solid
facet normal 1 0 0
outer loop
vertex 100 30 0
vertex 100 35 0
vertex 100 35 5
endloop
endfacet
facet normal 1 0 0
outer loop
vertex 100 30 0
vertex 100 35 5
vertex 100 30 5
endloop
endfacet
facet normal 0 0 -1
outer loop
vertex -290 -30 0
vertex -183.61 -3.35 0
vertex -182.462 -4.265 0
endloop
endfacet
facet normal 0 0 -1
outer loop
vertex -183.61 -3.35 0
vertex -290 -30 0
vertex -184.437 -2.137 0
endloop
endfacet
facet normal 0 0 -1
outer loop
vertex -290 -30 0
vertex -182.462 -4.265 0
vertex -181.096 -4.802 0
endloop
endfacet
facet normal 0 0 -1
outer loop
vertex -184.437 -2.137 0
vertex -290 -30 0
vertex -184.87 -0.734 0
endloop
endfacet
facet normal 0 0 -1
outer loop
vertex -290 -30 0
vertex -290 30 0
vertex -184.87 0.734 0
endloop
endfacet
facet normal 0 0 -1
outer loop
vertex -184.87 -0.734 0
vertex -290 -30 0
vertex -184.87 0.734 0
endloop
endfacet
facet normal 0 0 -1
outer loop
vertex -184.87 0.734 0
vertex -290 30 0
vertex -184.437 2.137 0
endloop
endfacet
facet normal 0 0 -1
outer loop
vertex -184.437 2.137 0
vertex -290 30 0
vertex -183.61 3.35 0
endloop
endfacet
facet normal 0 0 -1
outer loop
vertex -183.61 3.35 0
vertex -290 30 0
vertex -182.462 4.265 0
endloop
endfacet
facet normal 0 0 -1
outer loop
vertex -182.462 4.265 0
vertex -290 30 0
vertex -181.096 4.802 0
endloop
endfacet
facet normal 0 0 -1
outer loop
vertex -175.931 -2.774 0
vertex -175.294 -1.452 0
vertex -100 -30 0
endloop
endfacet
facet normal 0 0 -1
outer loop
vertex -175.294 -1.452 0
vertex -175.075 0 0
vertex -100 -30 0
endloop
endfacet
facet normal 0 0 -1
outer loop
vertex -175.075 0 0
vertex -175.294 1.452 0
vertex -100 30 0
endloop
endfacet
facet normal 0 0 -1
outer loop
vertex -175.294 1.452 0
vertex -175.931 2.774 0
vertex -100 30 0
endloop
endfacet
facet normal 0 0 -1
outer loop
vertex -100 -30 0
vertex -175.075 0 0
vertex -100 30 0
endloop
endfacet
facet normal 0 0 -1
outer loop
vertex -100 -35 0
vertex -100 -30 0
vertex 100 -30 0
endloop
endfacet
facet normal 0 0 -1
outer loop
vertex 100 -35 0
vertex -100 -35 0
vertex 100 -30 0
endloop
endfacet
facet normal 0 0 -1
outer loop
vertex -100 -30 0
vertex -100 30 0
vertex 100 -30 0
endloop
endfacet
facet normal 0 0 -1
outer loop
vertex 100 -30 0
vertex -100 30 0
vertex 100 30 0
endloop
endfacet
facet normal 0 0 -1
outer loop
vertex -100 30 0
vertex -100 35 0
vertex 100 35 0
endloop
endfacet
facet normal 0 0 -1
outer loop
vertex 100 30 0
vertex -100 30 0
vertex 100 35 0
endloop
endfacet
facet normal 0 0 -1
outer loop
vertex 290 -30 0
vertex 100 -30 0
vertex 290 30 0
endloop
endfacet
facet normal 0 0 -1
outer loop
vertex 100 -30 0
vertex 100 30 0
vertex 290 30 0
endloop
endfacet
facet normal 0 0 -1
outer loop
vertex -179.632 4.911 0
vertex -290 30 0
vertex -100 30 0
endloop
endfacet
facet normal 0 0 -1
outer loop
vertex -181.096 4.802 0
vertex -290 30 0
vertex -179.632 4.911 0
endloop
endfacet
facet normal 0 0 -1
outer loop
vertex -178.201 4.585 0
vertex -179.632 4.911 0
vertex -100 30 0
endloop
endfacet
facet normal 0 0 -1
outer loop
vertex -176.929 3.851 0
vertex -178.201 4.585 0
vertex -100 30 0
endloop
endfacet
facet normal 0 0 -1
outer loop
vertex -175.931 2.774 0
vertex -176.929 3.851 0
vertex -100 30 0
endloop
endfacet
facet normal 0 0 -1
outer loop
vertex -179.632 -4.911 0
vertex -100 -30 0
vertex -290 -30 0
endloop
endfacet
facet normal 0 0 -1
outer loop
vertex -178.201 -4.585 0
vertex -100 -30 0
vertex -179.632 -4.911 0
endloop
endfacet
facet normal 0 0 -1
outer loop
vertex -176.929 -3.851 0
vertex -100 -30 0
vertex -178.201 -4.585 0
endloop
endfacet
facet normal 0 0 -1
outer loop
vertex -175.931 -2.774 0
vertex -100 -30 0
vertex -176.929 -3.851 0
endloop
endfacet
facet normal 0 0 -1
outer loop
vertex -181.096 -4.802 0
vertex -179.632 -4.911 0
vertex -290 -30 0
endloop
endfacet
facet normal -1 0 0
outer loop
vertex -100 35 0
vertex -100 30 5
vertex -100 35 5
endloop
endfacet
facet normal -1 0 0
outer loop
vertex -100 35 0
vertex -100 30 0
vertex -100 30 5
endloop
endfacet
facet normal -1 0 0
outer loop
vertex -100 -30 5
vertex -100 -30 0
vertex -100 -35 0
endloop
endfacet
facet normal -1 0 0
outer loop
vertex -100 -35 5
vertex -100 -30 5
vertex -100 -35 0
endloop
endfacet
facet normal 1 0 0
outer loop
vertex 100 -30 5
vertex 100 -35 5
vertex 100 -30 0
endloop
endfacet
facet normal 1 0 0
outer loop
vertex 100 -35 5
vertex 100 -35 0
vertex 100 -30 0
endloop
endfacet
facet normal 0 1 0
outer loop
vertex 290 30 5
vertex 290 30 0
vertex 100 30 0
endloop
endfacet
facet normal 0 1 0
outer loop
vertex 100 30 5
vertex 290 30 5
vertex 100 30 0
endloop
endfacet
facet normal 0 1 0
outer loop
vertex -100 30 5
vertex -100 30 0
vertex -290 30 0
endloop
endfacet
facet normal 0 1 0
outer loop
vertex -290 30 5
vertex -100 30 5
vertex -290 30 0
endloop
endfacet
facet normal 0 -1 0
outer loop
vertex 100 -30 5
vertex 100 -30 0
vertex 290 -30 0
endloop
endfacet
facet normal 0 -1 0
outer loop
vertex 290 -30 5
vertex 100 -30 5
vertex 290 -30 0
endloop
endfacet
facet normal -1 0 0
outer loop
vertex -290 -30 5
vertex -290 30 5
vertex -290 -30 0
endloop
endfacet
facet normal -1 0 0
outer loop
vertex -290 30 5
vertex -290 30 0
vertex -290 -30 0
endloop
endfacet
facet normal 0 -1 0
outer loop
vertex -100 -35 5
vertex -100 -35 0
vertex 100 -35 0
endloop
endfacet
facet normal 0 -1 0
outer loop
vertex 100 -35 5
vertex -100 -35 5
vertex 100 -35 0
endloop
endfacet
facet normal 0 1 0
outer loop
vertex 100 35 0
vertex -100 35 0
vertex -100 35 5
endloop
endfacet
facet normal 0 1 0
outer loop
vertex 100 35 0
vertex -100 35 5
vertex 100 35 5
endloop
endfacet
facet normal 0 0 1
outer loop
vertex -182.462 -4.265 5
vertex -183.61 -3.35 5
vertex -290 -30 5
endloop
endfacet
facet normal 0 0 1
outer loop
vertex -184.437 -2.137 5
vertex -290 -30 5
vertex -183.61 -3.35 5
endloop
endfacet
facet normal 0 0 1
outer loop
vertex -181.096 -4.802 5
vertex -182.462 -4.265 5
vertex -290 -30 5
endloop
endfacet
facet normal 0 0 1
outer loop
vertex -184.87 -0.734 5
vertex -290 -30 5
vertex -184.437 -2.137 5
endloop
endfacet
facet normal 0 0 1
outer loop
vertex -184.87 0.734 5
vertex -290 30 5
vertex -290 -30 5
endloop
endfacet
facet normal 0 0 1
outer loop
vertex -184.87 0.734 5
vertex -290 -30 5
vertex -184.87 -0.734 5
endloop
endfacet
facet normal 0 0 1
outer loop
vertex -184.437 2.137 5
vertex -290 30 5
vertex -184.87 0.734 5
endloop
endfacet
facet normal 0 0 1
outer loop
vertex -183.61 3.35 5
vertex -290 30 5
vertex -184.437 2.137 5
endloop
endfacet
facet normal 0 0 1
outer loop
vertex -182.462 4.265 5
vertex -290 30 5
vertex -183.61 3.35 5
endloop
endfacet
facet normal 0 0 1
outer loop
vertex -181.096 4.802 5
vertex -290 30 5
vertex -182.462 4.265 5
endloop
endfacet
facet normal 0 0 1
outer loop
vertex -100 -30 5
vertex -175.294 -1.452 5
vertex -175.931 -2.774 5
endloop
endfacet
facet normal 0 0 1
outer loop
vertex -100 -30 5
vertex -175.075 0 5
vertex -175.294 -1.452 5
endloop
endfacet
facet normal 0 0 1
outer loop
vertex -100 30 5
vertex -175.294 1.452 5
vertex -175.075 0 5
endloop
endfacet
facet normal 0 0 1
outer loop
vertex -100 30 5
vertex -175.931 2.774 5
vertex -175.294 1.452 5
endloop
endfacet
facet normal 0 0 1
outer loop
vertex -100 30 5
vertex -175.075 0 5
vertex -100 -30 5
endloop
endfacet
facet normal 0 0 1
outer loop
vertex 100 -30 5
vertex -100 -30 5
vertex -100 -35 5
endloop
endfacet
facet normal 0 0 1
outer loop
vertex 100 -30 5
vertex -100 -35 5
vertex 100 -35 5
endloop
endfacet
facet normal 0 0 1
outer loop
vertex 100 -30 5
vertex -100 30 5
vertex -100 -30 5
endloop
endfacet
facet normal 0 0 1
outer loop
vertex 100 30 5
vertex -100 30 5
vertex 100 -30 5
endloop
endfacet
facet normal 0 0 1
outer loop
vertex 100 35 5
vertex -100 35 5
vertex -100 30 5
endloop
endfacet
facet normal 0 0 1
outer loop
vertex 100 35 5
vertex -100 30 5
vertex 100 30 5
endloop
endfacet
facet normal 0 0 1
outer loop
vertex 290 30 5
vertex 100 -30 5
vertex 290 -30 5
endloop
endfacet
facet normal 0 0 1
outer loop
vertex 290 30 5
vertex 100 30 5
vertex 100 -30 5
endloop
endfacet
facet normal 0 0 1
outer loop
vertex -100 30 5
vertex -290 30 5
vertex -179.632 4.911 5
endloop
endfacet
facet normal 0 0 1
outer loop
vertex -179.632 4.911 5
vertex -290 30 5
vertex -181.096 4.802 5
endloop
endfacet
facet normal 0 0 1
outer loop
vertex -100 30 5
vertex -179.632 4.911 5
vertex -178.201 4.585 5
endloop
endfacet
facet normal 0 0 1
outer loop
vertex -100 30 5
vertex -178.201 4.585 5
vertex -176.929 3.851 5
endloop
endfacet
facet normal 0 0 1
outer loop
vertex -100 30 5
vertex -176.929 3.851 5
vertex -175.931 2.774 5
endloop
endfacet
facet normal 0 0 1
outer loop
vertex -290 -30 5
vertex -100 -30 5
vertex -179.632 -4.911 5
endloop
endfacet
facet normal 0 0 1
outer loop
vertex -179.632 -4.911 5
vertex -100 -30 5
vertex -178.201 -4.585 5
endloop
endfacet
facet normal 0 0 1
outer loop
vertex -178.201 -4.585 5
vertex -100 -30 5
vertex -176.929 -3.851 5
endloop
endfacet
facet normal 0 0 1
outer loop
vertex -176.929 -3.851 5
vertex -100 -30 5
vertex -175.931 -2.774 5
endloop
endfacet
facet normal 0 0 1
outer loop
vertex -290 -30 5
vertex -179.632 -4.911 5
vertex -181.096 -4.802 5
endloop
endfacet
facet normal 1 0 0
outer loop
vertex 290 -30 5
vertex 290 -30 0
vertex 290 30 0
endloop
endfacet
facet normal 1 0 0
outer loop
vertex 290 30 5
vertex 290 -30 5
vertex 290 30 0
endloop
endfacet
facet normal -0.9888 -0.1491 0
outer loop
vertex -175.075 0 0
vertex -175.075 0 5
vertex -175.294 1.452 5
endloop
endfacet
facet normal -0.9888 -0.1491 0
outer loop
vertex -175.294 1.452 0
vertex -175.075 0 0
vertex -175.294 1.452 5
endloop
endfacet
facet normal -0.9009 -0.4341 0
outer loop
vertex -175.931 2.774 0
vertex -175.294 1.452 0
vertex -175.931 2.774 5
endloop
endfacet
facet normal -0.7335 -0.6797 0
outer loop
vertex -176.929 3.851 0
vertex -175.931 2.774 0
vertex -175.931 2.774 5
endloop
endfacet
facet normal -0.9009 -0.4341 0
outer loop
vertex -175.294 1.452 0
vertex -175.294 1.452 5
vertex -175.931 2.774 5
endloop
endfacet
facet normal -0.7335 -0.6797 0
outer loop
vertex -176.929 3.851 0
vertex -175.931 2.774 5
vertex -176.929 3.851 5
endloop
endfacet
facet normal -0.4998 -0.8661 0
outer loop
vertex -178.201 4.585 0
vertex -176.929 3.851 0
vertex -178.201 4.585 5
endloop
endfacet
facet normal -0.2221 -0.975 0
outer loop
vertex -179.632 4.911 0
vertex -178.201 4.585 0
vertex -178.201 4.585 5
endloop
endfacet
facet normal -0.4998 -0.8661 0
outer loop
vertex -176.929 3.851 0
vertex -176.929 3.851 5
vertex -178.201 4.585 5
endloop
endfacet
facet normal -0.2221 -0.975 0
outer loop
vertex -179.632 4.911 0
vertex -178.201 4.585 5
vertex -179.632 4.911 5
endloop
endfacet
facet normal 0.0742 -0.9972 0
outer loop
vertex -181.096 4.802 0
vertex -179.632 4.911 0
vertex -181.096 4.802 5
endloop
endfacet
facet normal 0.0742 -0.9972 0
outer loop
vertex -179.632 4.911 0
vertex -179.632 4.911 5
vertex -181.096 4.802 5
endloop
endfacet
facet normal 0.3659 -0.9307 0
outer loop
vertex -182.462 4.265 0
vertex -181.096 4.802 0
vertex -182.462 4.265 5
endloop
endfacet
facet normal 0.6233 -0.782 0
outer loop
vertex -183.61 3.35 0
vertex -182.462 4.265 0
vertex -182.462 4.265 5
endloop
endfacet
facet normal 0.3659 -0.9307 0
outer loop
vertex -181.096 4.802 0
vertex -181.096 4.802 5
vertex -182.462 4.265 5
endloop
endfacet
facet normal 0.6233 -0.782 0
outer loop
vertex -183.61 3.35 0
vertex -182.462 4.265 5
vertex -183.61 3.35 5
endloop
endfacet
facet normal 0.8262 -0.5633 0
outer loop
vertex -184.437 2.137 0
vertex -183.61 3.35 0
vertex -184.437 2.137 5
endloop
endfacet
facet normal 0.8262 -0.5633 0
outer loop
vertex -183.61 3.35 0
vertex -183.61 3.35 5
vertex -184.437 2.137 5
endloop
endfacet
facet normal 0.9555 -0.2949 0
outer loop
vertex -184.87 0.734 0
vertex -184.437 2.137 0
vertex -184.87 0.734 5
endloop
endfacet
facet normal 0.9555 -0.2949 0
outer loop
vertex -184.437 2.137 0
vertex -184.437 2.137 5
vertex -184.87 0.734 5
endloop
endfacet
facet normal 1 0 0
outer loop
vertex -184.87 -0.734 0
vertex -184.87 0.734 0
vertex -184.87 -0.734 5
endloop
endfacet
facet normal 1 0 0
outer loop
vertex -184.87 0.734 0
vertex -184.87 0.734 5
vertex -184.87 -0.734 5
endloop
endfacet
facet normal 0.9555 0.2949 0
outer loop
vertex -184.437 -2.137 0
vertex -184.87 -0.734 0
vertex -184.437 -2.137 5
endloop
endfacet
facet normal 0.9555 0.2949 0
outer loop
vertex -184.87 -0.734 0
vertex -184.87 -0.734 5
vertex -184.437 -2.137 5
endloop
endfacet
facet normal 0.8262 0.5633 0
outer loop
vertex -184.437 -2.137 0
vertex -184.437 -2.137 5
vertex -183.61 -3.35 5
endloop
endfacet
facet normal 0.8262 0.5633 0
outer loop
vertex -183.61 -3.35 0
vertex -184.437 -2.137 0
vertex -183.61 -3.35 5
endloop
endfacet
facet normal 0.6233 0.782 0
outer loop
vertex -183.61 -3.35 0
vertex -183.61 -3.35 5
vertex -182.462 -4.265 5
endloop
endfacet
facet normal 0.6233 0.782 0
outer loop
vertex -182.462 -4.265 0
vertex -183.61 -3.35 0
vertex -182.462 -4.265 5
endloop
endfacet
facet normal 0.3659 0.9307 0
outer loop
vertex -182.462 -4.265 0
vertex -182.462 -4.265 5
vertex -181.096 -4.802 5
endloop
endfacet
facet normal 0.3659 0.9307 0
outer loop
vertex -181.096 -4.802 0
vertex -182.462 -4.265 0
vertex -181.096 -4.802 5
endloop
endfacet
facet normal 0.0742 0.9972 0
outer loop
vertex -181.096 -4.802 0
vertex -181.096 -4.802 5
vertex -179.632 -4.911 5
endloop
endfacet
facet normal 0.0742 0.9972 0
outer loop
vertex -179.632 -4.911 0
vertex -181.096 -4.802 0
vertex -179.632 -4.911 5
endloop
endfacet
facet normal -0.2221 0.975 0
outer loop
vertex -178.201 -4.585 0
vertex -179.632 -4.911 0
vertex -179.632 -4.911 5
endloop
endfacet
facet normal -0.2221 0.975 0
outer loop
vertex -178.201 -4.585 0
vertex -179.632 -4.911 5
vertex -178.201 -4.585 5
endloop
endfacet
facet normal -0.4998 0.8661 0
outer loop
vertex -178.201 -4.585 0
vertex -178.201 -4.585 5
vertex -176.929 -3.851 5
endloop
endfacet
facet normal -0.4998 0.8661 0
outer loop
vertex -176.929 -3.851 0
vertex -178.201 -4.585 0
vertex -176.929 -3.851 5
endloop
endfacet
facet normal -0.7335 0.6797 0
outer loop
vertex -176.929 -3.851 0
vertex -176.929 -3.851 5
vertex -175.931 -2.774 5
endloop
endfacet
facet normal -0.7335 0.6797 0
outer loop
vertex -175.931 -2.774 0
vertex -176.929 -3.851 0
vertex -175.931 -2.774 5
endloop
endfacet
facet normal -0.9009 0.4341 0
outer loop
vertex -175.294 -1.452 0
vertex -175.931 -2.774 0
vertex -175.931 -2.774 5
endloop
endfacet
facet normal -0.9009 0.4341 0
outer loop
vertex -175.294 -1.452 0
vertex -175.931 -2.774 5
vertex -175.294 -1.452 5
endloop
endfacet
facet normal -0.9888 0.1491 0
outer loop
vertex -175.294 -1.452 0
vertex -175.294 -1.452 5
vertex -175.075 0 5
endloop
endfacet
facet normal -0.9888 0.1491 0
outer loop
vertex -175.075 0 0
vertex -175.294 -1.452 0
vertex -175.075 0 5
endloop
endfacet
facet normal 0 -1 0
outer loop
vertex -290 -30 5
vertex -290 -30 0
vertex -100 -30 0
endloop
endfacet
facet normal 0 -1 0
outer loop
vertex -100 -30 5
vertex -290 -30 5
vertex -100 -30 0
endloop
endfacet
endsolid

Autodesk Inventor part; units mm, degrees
ref_plane "YZ Plane" through (0, 0, 0) normal (1, 0, 0) x (0, 1, 0)
ref_plane "XZ Plane" through (0, 0, 0) normal (0, 1, 0) x (-1, 0, 0)
ref_plane "XY Plane" through (0, 0, 0) normal (0, 0, 1) x (1, 0, 0)
sketch "Sketch1" plane through (0, 0, 0) normal (0, 0, 1) x (1, 0, 0)
  line L0 (-290, -30) -> (290, -30)
  line L1 (290, -30) -> (290, 30)
  line L2 (290, 30) -> (-290, 30)
  line L3 (-290, 30) -> (-290, -30)
  line L4 (-290, -30) -> (290, 30) construction
  line L5 (290, -30) -> (-290, 30) construction
  line L6 (-100, 35) -> (100, 35)
  line L7 (100, 35) -> (100, 30)
  line L8 (100, 30) -> (-100, 30)
  line L9 (-100, 30) -> (-100, 35)
  line L10 (-100, 35) -> (100, 30) construction
  line L11 (100, 35) -> (-100, 30) construction
  line L12 (-290, 0) -> (290, 0)
  line L13 (-100, -35) -> (100, -35)
  line L14 (100, -35) -> (100, -30)
  line L15 (100, -30) -> (-100, -30)
  line L16 (-100, -30) -> (-100, -35)
  line L17 (-100, -35) -> (100, -30) construction
  line L18 (100, -35) -> (-100, -30) construction
  point P0 (0, 0)
  point P1 (0, 32.5)
  point P2 (0, 30)
  point P3 (0, -32.5)
  point P4 (0, -30)
  point P5 (-100, 30)
  point P6 (-100, -30)
  dimension "d0" = 580
  dimension "d1" = 60
  dimension "d2" = 5
  dimension "d3" = 200
extrude "Plate1" add sketch "Sketch1" along normal blind 5
sketch "Sketch2" plane through (0, 0, 5) normal (0, 0, 1) x (1, 0, 0)
  circle A0 centre (-180, 0) radius 4.925
  point P0 (0, 0)
  dimension "d5" = 9.85
  dimension "d6" = 180
extrude "Cut1" cut sketch "Sketch2" against normal blind 5
equation "\"d7\" = Thickness"
equation "\"d4\" = Thickness"
equation "\"BendRadius\" = Thickness"
equation "\"BendReliefWidth\" = Thickness"
equation "\"BendReliefDepth\" = 0.5 * Thickness"
equation "\"TransitionRadius\" = BendRadius"
equation "\"JacobiRadiusSize\" = BendRadius"
equation "\"GapSize\" = Thickness"
equation "\"Thickness\" = 5"
properties part number "Table-Base Fixation ( Power Port )"
